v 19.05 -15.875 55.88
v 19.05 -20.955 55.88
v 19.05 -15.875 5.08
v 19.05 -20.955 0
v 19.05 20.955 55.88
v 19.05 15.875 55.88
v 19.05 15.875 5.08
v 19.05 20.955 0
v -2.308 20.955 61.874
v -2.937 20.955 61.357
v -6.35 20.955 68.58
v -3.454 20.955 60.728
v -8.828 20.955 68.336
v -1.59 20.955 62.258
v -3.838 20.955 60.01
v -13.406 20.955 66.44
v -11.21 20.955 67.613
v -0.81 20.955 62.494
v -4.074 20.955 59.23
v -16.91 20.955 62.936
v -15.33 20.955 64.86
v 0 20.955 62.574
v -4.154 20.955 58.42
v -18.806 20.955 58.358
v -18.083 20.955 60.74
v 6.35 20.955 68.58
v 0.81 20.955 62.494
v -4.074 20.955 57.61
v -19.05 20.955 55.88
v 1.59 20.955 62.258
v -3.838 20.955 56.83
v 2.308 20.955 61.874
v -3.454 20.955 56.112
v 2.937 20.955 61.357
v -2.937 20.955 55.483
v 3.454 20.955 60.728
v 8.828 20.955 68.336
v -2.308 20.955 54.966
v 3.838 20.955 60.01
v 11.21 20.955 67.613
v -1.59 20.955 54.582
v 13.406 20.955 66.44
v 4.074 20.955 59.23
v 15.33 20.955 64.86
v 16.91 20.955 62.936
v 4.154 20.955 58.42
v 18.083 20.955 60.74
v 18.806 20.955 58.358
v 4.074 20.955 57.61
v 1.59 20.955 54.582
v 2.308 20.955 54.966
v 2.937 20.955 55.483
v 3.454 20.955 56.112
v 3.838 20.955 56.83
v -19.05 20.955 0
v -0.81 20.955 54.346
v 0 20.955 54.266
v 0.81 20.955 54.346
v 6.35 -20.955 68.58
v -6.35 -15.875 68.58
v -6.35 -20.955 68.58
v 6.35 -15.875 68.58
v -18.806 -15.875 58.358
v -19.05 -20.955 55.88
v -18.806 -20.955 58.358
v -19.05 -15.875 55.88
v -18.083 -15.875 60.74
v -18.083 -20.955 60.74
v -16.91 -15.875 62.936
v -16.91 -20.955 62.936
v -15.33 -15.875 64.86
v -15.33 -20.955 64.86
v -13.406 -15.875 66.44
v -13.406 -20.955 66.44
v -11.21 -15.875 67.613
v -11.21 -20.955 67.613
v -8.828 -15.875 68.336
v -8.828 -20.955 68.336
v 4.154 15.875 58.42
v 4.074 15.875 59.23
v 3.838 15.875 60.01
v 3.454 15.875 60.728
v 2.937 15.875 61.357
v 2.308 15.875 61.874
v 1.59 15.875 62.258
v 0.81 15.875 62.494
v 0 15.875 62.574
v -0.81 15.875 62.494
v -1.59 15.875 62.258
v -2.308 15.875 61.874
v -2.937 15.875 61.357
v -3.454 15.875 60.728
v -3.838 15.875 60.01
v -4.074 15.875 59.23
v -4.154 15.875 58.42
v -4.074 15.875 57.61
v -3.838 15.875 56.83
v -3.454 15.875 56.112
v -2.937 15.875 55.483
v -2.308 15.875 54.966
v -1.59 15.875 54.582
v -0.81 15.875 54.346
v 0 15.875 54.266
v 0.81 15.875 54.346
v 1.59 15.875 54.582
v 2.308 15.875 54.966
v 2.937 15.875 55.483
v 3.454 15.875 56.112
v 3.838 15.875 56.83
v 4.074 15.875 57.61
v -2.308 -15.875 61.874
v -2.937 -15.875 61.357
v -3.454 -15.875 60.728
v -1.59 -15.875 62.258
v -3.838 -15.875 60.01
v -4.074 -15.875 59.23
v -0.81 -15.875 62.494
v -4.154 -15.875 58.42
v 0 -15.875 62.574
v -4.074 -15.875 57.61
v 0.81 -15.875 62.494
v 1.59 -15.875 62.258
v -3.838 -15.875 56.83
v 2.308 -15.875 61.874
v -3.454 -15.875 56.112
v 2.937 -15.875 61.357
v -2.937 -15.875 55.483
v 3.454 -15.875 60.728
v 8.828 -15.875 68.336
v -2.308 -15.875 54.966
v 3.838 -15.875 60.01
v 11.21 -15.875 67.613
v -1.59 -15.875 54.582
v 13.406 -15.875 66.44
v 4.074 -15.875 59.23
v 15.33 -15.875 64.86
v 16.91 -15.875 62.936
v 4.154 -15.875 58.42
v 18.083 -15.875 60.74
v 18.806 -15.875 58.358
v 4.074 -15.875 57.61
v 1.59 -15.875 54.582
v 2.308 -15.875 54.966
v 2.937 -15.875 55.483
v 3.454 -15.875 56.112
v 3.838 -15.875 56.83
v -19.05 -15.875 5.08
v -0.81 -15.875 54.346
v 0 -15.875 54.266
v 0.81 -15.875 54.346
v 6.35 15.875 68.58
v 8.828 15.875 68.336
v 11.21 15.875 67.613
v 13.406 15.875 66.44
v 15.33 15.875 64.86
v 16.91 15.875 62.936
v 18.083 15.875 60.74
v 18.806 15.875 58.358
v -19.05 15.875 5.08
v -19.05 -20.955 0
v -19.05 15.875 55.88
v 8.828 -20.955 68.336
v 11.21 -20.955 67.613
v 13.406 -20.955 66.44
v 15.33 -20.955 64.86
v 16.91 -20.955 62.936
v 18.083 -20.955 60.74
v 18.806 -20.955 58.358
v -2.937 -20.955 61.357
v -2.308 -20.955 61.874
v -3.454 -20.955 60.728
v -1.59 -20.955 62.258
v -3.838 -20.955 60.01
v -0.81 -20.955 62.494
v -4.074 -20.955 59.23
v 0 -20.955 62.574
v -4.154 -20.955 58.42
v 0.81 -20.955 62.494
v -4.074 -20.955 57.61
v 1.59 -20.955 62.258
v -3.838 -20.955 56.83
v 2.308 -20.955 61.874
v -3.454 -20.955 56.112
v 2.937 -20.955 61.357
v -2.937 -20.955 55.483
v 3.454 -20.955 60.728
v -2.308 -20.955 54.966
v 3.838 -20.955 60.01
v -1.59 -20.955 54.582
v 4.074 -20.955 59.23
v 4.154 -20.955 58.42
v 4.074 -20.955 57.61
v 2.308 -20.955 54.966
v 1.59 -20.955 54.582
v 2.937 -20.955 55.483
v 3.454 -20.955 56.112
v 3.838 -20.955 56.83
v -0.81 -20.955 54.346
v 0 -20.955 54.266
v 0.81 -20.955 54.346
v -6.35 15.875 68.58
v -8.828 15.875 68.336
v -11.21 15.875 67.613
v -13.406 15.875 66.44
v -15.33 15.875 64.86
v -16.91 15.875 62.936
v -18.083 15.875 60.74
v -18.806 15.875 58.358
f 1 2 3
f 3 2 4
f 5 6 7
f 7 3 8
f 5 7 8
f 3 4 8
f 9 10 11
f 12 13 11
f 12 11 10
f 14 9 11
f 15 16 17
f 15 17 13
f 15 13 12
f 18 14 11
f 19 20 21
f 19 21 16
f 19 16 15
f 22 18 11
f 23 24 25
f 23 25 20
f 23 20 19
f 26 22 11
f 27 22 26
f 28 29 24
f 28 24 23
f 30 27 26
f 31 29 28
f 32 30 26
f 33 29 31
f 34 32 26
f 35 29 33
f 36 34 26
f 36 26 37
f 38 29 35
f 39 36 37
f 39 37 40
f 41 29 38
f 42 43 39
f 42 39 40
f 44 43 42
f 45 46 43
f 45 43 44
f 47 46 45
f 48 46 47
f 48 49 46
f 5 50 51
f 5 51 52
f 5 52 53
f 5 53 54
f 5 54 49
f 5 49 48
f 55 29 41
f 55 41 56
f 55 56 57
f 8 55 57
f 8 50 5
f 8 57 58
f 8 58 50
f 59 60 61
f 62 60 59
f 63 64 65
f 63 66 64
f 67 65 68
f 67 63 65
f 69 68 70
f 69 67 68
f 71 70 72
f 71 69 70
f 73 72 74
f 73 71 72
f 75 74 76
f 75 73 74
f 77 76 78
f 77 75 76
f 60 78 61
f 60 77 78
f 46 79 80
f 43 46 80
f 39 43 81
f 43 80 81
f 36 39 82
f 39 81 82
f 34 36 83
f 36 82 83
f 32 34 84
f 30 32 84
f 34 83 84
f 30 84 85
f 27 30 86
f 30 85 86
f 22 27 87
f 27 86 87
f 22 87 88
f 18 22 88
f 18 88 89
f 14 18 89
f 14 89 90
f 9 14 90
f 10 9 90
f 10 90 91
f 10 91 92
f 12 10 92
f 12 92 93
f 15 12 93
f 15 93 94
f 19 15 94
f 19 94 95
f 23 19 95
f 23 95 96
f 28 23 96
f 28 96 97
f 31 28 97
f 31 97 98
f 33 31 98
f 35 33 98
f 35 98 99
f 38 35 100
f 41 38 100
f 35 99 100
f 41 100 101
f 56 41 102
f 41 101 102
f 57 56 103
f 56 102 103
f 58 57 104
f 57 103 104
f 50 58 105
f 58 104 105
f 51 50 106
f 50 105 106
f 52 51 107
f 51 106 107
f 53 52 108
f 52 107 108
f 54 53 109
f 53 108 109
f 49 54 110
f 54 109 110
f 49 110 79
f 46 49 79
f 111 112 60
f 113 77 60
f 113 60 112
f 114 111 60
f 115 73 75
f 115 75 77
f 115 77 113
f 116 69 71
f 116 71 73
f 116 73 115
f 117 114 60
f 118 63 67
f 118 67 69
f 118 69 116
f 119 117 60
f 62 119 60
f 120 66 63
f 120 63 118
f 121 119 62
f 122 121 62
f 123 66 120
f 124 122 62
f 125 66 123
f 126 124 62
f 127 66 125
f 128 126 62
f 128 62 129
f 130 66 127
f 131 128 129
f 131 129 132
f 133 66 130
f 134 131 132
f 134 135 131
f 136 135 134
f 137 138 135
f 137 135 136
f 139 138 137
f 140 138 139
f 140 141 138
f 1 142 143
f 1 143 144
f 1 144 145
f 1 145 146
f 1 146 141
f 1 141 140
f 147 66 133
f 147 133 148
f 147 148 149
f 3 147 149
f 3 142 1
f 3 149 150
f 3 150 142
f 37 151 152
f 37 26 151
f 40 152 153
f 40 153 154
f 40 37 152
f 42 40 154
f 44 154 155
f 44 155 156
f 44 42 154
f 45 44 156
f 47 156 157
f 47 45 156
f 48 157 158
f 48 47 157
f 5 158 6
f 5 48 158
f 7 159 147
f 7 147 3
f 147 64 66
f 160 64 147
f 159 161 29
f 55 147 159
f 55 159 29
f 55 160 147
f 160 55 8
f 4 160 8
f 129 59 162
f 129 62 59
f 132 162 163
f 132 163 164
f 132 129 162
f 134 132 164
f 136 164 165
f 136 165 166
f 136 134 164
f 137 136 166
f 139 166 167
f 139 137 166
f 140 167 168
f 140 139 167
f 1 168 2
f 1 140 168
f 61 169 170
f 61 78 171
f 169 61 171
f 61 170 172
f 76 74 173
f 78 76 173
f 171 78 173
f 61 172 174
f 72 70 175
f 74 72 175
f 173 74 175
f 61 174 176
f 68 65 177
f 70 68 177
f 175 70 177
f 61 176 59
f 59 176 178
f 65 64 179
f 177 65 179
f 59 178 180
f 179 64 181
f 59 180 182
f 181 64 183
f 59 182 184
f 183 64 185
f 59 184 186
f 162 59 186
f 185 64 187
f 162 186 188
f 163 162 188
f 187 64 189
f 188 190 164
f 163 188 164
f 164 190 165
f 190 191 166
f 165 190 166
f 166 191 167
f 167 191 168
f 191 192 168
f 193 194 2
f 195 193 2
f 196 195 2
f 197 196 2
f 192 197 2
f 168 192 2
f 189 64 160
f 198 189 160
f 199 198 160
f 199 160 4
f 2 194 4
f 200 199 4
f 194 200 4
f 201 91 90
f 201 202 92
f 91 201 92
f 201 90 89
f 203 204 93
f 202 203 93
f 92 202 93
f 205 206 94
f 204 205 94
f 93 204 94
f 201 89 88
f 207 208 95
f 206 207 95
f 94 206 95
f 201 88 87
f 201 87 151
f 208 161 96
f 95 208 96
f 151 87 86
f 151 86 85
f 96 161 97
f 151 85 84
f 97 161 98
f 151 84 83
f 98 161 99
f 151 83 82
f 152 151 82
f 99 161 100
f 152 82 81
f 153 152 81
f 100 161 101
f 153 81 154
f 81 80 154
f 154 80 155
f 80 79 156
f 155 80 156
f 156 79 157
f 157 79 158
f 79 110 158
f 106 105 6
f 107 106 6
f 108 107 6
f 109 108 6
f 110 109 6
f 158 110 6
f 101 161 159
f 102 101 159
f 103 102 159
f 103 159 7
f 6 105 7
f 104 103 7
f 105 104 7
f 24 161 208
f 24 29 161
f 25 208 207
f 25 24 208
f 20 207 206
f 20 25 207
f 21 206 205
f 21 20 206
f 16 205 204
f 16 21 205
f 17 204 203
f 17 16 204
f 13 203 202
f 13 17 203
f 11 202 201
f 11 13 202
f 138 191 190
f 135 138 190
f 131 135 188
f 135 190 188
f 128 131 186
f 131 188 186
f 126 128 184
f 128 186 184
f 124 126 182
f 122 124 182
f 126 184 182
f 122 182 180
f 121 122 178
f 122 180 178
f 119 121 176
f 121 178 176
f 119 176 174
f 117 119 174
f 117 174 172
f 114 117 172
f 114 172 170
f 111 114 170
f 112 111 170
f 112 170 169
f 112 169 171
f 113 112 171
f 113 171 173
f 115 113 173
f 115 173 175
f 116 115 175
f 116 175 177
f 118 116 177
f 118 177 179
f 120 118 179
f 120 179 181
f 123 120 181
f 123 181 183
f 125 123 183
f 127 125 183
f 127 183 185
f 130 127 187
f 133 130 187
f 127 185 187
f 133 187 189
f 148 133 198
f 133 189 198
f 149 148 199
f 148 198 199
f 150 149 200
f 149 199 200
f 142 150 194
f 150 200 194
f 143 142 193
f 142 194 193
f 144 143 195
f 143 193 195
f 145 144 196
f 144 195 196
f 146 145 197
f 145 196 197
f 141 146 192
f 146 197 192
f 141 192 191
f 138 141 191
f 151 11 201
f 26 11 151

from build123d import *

# Parameters (mm, degrees)
F0_W     = 38.1
F0_H     = 41.91
F1_DEPTH = 5.08
F2_W     = 38.1
F2_H     = 5.08
F3_DEPTH = 63.5
F4_R     = 4.153748588
F5_DEPTH = 48.768
F6_R     = 12.7


with BuildPart() as f1:
    # F0 (on Top) → F1 (new body)
    with BuildSketch(Plane.XY):
        Rectangle(F0_W, F0_H)
    extrude(amount=F1_DEPTH)

    # F2 (on face) → F3 (join)
    with BuildSketch(Plane.XY.offset(5.08)):
        with Locations((0, 18.415)):
            Rectangle(F2_W, F2_H)
        with Locations((0, -18.415)):
            Rectangle(F2_W, F2_H)
    extrude(amount=F3_DEPTH)

    # F4 (on face) → F5 (cut)
    with BuildSketch(Plane.XZ.offset(20.955)):
        with Locations((0, 58.42)):
            Circle(F4_R)
    extrude(amount=-F5_DEPTH, mode=Mode.SUBTRACT)

    # F6
    f6_edges = [f1.edges().sort_by_distance(p)[0] for p in [
        (-19.05, -18.415, 68.58),
        (-19.05, 18.415, 68.58),
        (19.05, -18.415, 68.58),
        (19.05, 18.415, 68.58),
    ]]
    fillet(f6_edges, radius=F6_R)


solid = f1.part
